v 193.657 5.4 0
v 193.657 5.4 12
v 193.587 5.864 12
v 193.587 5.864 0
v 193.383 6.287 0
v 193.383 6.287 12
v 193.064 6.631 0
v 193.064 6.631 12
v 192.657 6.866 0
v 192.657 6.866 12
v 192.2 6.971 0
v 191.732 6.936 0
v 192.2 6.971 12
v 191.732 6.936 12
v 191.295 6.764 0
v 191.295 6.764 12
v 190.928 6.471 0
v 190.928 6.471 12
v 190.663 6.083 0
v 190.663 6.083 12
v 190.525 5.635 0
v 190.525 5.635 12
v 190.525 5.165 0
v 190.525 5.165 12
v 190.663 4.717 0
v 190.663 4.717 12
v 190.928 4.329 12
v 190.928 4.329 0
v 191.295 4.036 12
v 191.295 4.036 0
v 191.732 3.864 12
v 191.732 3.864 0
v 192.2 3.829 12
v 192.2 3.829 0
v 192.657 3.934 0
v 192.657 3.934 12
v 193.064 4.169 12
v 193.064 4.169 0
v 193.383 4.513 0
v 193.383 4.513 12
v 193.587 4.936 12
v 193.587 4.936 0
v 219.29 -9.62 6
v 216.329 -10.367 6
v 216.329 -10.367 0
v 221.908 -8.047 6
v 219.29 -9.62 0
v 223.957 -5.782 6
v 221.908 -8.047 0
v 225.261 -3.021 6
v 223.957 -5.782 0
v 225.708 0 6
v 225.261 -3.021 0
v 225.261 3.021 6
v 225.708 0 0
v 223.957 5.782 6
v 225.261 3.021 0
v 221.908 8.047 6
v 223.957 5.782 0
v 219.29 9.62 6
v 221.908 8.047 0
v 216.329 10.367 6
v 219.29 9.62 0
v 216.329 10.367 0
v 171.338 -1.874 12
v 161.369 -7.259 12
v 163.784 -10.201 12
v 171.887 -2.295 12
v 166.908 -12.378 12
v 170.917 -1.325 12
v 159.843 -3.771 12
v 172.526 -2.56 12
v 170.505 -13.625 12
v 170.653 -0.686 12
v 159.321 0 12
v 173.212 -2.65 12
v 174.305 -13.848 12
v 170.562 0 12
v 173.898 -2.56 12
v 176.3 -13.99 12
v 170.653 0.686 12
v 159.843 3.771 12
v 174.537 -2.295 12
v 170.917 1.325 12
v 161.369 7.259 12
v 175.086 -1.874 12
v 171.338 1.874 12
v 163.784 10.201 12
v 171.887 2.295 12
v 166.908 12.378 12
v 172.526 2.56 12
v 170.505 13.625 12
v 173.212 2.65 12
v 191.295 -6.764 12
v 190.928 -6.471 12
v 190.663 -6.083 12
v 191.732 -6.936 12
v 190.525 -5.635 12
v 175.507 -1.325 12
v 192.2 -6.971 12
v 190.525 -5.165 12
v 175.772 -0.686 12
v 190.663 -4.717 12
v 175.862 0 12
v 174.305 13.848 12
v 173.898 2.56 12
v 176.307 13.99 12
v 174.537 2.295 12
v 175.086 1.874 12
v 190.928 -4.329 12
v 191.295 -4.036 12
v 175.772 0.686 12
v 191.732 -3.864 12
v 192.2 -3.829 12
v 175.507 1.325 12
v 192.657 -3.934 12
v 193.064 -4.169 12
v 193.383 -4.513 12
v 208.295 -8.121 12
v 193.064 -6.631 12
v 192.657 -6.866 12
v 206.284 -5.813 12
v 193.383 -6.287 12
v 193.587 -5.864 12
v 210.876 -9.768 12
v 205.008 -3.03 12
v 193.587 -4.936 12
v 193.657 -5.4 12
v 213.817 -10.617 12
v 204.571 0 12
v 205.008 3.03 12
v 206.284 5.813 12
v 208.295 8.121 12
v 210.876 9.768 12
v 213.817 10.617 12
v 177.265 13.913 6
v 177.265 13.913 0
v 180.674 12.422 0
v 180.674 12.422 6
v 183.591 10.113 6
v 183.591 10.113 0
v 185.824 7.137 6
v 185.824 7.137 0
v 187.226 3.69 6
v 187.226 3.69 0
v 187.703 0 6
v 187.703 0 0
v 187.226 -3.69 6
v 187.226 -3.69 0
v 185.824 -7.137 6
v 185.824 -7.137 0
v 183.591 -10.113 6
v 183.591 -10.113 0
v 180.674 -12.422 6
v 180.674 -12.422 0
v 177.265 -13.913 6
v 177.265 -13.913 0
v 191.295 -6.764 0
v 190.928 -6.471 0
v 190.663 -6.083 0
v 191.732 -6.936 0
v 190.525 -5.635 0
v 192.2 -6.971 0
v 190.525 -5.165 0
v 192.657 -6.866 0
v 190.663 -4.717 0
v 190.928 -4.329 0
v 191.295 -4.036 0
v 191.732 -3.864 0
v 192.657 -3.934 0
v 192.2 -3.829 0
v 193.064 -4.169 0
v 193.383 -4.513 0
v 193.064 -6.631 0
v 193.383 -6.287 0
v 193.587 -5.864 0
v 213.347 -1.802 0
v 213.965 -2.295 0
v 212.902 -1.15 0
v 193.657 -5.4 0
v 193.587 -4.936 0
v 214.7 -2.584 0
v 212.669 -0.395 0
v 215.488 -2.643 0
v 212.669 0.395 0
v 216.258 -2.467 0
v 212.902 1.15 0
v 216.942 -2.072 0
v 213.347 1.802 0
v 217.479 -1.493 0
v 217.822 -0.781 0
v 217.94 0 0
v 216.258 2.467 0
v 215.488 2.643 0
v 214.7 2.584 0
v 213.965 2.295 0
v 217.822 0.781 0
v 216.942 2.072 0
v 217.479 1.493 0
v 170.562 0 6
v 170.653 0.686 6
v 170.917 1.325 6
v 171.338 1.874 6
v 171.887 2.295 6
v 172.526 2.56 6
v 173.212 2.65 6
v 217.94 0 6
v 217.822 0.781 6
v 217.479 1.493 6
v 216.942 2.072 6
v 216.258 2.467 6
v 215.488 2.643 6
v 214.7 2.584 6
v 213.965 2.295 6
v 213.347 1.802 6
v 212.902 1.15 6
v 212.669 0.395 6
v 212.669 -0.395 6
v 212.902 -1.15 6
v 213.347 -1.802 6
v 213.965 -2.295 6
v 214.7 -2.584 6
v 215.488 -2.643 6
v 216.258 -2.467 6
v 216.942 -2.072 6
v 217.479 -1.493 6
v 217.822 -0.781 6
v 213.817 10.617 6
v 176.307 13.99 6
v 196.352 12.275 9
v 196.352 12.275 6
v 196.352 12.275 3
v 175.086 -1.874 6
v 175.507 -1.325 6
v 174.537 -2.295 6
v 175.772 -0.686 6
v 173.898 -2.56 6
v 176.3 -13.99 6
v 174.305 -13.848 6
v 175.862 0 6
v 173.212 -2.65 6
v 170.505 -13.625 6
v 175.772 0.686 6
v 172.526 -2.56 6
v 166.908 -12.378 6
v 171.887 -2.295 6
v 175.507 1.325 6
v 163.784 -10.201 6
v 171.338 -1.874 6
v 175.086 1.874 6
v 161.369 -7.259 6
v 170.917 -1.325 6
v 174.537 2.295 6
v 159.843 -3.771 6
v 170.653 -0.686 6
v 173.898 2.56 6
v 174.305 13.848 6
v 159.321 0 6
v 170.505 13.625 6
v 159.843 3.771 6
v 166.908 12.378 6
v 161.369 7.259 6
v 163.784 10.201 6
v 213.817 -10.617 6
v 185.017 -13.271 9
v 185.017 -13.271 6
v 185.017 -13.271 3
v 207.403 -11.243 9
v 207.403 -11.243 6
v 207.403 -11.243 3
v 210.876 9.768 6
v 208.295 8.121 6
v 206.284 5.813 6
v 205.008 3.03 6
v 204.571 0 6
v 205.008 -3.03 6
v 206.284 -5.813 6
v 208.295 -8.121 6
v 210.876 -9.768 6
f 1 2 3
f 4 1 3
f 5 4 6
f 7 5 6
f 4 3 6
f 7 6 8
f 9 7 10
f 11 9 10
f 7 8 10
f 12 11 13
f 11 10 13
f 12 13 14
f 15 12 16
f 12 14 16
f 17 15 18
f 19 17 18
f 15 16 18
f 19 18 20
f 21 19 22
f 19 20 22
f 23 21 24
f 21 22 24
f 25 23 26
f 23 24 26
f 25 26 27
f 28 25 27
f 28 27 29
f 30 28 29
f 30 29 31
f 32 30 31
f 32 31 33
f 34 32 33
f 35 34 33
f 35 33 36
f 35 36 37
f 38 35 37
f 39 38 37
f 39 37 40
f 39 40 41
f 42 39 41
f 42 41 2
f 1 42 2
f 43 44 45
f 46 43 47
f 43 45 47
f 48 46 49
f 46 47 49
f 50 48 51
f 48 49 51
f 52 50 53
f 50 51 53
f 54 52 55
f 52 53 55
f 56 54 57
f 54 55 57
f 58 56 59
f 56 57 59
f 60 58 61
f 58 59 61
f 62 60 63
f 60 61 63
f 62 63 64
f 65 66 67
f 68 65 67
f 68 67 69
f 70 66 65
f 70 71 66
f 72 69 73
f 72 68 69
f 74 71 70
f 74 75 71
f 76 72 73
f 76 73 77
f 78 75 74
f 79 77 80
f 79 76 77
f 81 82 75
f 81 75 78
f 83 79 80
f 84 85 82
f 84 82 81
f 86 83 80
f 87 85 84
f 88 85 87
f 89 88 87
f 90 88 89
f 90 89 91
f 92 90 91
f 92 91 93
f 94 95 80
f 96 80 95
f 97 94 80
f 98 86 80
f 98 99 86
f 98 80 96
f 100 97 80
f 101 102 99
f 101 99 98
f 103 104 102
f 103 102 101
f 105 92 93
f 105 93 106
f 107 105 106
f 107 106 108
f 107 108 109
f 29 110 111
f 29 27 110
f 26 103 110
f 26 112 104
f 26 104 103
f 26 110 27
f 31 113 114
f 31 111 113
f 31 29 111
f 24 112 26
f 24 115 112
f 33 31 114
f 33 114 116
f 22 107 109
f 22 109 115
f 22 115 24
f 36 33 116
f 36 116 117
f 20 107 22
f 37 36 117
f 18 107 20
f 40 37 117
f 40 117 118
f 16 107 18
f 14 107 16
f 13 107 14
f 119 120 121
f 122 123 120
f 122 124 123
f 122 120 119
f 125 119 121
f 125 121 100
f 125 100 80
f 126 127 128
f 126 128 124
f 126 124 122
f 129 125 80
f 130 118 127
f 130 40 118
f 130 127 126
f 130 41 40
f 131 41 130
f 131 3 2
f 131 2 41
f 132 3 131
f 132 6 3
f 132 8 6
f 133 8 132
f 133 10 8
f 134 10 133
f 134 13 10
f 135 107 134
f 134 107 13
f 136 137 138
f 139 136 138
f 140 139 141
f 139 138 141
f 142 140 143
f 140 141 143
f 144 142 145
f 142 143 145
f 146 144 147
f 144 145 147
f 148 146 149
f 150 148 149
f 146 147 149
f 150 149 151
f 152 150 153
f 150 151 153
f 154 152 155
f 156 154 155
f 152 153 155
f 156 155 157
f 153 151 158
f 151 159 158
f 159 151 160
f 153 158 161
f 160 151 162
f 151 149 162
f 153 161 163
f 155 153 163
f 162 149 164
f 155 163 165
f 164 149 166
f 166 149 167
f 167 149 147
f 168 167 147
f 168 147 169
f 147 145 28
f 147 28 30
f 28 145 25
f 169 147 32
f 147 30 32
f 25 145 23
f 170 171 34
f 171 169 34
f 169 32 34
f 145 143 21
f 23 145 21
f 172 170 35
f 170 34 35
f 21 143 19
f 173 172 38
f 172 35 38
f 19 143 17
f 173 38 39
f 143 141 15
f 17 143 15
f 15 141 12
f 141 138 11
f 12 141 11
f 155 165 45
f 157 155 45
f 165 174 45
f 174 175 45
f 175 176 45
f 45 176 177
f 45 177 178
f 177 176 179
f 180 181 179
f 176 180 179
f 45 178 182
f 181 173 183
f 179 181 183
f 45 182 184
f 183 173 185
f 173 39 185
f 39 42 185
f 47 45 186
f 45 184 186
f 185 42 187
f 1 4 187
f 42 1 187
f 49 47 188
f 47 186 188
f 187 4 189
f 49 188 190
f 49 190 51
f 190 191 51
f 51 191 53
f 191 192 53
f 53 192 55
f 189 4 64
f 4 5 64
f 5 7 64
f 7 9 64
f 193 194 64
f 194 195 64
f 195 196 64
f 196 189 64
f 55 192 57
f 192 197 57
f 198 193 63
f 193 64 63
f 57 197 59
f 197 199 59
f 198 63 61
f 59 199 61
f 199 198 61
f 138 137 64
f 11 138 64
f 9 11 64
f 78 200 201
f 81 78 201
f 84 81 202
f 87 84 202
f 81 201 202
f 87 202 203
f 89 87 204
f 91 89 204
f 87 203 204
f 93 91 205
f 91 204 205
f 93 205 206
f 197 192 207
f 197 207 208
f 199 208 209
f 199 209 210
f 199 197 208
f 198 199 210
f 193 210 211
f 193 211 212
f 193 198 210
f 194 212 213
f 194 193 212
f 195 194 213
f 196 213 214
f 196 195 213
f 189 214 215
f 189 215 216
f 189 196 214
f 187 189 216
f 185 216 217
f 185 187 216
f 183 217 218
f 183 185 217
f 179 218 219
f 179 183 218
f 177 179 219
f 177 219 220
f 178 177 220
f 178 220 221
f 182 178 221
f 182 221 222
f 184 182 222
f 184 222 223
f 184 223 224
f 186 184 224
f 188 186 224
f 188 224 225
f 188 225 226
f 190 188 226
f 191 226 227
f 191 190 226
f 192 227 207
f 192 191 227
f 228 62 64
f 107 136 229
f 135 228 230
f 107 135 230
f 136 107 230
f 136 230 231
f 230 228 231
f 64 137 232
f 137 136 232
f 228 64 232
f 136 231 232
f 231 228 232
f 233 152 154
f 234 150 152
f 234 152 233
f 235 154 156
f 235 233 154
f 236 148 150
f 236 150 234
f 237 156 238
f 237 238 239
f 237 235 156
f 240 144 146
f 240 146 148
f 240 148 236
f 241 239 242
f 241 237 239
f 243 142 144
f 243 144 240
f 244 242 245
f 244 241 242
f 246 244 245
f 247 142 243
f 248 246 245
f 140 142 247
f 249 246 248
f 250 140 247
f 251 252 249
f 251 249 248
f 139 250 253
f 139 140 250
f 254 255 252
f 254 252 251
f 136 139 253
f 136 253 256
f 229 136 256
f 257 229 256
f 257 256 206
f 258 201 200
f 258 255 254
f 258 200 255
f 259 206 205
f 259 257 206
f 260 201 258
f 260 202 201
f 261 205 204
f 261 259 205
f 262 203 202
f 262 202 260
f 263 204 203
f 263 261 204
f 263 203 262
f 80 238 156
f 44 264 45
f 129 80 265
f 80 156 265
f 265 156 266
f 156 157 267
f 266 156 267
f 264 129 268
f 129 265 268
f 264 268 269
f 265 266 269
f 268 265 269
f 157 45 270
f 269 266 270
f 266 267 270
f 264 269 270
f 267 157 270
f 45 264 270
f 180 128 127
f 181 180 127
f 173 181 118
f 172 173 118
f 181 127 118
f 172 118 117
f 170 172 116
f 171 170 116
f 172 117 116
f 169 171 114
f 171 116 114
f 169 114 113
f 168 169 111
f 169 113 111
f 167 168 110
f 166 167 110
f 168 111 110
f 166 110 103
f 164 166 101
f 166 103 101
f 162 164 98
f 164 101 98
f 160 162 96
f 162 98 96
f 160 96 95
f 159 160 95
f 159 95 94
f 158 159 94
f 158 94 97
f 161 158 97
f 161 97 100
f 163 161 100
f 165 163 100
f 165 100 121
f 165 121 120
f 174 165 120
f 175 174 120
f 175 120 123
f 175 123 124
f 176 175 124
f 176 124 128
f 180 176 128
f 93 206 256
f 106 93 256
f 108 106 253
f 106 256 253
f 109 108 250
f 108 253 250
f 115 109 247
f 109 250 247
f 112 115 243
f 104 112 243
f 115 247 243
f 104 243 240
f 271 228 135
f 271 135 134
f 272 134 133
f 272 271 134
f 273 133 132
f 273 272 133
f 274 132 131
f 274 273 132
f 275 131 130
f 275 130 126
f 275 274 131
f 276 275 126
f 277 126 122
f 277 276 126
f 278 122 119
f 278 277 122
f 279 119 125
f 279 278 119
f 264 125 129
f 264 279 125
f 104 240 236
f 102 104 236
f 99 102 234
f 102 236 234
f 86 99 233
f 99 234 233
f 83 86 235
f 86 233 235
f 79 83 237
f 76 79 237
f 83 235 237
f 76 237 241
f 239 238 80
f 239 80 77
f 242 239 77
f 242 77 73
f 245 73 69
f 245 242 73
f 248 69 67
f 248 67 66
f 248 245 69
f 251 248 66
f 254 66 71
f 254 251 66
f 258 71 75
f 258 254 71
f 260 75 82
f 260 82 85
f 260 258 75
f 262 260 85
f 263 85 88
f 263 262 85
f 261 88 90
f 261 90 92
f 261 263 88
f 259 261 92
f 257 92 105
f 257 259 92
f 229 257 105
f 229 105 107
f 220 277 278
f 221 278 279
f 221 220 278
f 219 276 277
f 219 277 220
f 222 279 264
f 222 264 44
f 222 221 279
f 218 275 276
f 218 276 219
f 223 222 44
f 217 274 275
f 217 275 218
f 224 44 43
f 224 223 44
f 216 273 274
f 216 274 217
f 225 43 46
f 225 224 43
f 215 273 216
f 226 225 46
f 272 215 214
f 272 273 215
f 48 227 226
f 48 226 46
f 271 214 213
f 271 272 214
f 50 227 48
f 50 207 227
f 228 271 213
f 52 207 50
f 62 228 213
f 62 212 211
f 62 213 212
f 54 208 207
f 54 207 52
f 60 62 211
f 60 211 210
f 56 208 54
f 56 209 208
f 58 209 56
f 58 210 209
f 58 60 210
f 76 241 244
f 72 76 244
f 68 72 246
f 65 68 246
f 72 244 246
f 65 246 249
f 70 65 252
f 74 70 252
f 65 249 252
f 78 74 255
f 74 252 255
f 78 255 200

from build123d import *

# Parameters (mm, degrees)
BOSS_EXTRUDE13_START = 6
BOSS_EXTRUDE13_DEPTH = 6
BOSS_EXTRUDE14_DEPTH = 12
SKETCH2_19_R         = 10.418590799
SKETCH2_19_R_2       = 2.65
BOSS_EXTRUDE15_DEPTH = 6
CUT_EXTRUDE1_START   = -6
CUT_EXTRUDE1_DEPTH   = 6
CUT_EXTRUDE2_START   = -12
CUT_EXTRUDE2_DEPTH   = 6
CUT_EXTRUDE4_DEPTH   = 6
SKETCH6_R            = 1.575
CUT_EXTRUDE5_DEPTH   = 227.459741668


# Read off the part's stored shape, not the designer's step: Cut-Extrude2
with BuildPart() as part:
    # Sketch2 → Boss-Extrude13 (new body)
    with BuildSketch(Plane.XY.offset(BOSS_EXTRUDE13_START)):
        with BuildLine():
            ThreePointArc((173.212265813, 14.190949605), (163.177749116, 10.034516697), (159.021316208, 0))
            Line((159.021316208, 0), (170.562265813, 0))
            ThreePointArc((170.562265813, 0), (171.338432843, 1.87383297), (173.212265813, 2.65))
            Line((173.212265813, 2.65), (173.212265813, 14.190949605))
        make_face()
        with BuildLine():
            Line((170.562265813, 0), (159.021316208, 0))
            ThreePointArc((159.021316208, 0), (163.177749116, -10.034516697), (173.212265813, -14.190949605))
            Line((173.212265813, -14.190949605), (173.212265813, -2.65))
            ThreePointArc((173.212265813, -2.65), (171.338432843, -1.87383297), (170.562265813, 0))
        make_face()
        with BuildLine():
            ThreePointArc((187.403215418, 0), (183.634025716, 9.63171694), (174.328689217, 14.146966087))
            ThreePointArc((174.328689217, 14.146966087), (173.77091055, 14.179949462), (173.212265813, 14.190949605))
            Line((173.212265813, 14.190949605), (173.212265813, 2.65))
            ThreePointArc((173.212265813, 2.65), (175.086098783, 1.87383297), (175.862265813, 0))
            Line((175.862265813, 0), (187.403215418, 0))
        make_face()
        with BuildLine():
            ThreePointArc((173.212265813, -14.190949605), (173.77091055, -14.179949462), (174.328689217, -14.146966087))
            ThreePointArc((174.328689217, -14.146966087), (183.634025716, -9.63171694), (187.403215418, 0))
            Line((187.403215418, 0), (175.862265813, 0))
            ThreePointArc((175.862265813, 0), (175.086098783, -1.87383297), (173.212265813, -2.65))
            Line((173.212265813, -2.65), (173.212265813, -14.190949605))
        make_face()
        with BuildLine():
            ThreePointArc((173.212265813, 14.190949605), (163.177749116, 10.034516697), (159.021316208, 0))
            Line((159.021316208, 0), (170.562265813, 0))
            ThreePointArc((170.562265813, 0), (171.338432843, 1.87383297), (173.212265813, 2.65))
            Line((173.212265813, 2.65), (173.212265813, 14.190949605))
        make_face()
        with BuildLine():
            Line((170.562265813, 0), (159.021316208, 0))
            ThreePointArc((159.021316208, 0), (163.177749116, -10.034516697), (173.212265813, -14.190949605))
            Line((173.212265813, -14.190949605), (173.212265813, -2.65))
            ThreePointArc((173.212265813, -2.65), (171.338432843, -1.87383297), (170.562265813, 0))
        make_face()
        with BuildLine():
            ThreePointArc((187.403215418, 0), (183.634025716, 9.63171694), (174.328689217, 14.146966087))
            ThreePointArc((174.328689217, 14.146966087), (173.77091055, 14.179949462), (173.212265813, 14.190949605))
            Line((173.212265813, 14.190949605), (173.212265813, 2.65))
            ThreePointArc((173.212265813, 2.65), (175.086098783, 1.87383297), (175.862265813, 0))
            Line((175.862265813, 0), (187.403215418, 0))
        make_face()
        with BuildLine():
            ThreePointArc((173.212265813, -14.190949605), (173.77091055, -14.179949462), (174.328689217, -14.146966087))
            ThreePointArc((174.328689217, -14.146966087), (183.634025716, -9.63171694), (187.403215418, 0))
            Line((187.403215418, 0), (175.862265813, 0))
            ThreePointArc((175.862265813, 0), (175.086098783, -1.87383297), (173.212265813, -2.65))
            Line((173.212265813, -2.65), (173.212265813, -14.190949605))
        make_face()
    extrude(amount=BOSS_EXTRUDE13_DEPTH)

    # Sketch2<18> → Boss-Extrude14 (add)
    with BuildSketch(Plane.XY):
        with BuildLine():
            add(Edge.make_bspline(
                [(216.328689217, 10.366667201), (213.353925458, 10.66477506), (206.696816501, 11.318389968), (196.26008685, 12.293724806), (185.235415917, 13.263427762), (177.892295007, 13.865740213), (174.328689217, 14.146966087)],
                knots=[0.137765812, 0.137765812, 0.137765812, 0.137765812, 0.152428309, 0.170571841, 0.189174522, 0.206706183, 0.206706183, 0.206706183, 0.206706183], degree=3))
            ThreePointArc((174.328689217, 14.146966087), (183.634025716, 9.63171694), (187.403215418, 0))
            Line((187.403215418, 0), (204.87123106, 0))
            ThreePointArc((204.87123106, 0), (207.922765654, 7.367056204), (215.289821859, 10.418590799))
            ThreePointArc((215.289821859, 10.418590799), (215.809903931, 10.405601803), (216.328689217, 10.366667201))
        make_face()
        with BuildLine():
            ThreePointArc((187.403215418, 0), (183.634025716, -9.63171694), (174.328689217, -14.146966087))
            add(Edge.make_bspline(
                [(174.328689217, -14.146966087), (177.892295007, -13.865740213), (185.235415917, -13.263427762), (196.26008685, -12.293724806), (206.696816501, -11.318389968), (213.353925458, -10.66477506), (216.328689217, -10.366667201)],
                knots=[0.793293817, 0.793293817, 0.793293817, 0.793293817, 0.810825478, 0.829428159, 0.847571691, 0.862234188, 0.862234188, 0.862234188, 0.862234188], degree=3))
            ThreePointArc((216.328689217, -10.366667201), (215.809903931, -10.405601803), (215.289821859, -10.418590799))
            ThreePointArc((215.289821859, -10.418590799), (207.922765654, -7.367056204), (204.87123106, 0))
            Line((204.87123106, 0), (187.403215418, 0))
        make_face()
        with BuildLine():
            add(Edge.make_bspline(
                [(216.328689217, 10.366667201), (213.353925458, 10.66477506), (206.696816501, 11.318389968), (196.26008685, 12.293724806), (185.235415917, 13.263427762), (177.892295007, 13.865740213), (174.328689217, 14.146966087)],
                knots=[0.137765812, 0.137765812, 0.137765812, 0.137765812, 0.152428309, 0.170571841, 0.189174522, 0.206706183, 0.206706183, 0.206706183, 0.206706183], degree=3))
            ThreePointArc((174.328689217, 14.146966087), (183.634025716, 9.63171694), (187.403215418, 0))
            Line((187.403215418, 0), (204.87123106, 0))
            ThreePointArc((204.87123106, 0), (207.922765654, 7.367056204), (215.289821859, 10.418590799))
            ThreePointArc((215.289821859, 10.418590799), (215.809903931, 10.405601803), (216.328689217, 10.366667201))
        make_face()
        with BuildLine():
            ThreePointArc((187.403215418, 0), (183.634025716, -9.63171694), (174.328689217, -14.146966087))
            add(Edge.make_bspline(
                [(174.328689217, -14.146966087), (177.892295007, -13.865740213), (185.235415917, -13.263427762), (196.26008685, -12.293724806), (206.696816501, -11.318389968), (213.353925458, -10.66477506), (216.328689217, -10.366667201)],
                knots=[0.793293817, 0.793293817, 0.793293817, 0.793293817, 0.810825478, 0.829428159, 0.847571691, 0.862234188, 0.862234188, 0.862234188, 0.862234188], degree=3))
            ThreePointArc((216.328689217, -10.366667201), (215.809903931, -10.405601803), (215.289821859, -10.418590799))
            ThreePointArc((215.289821859, -10.418590799), (207.922765654, -7.367056204), (204.87123106, 0))
            Line((204.87123106, 0), (187.403215418, 0))
        make_face()
    extrude(amount=BOSS_EXTRUDE14_DEPTH)

    # Sketch2<19> → Boss-Extrude15 (add)
    with BuildSketch(Plane.XY):
        with Locations((215.289821859, 0)):
            Circle(SKETCH2_19_R)
        with Locations((215.289821859, 0)):
            Circle(SKETCH2_19_R_2, mode=Mode.SUBTRACT)
    extrude(amount=BOSS_EXTRUDE15_DEPTH)

    # Sketch3 → Cut-Extrude1 (cut)
    with BuildSketch(Plane.XY.offset(12).offset(CUT_EXTRUDE1_START)):
        with BuildLine():
            ThreePointArc((174.305087765, -13.847895909), (159.321316208, 0), (174.305087765, 13.847895909))
            Line((174.305087765, 13.847895909), (176.307152097, 13.989700975))
            add(Edge.make_bspline(
                [(176.307152097, 13.989700975), (175.647694257, 14.042496099), (174.988206638, 14.094919544), (174.328689217, 14.146966087)],
                knots=[0.203461594, 0.203461594, 0.203461594, 0.203461594, 0.206706183, 0.206706183, 0.206706183, 0.206706183], degree=3))
            ThreePointArc((174.328689217, 14.146966087), (159.021316208, 0), (174.328689217, -14.146966087))
            add(Edge.make_bspline(
                [(174.328689217, -14.146966087), (174.985934365, -14.095098863), (175.643149915, -14.04285733), (176.300335892, -13.990246656)],
                knots=[0.793293817, 0.793293817, 0.793293817, 0.793293817, 0.796527227, 0.796527227, 0.796527227, 0.796527227], degree=3))
            Line((176.300335892, -13.990246656), (174.305087765, -13.847895909))
        make_face()
        with BuildLine():
            add(Edge.make_bspline(
                [(216.328689217, 10.366667201), (215.491519854, 10.450561851), (214.654303032, 10.533983064), (213.817038746, 10.616925102)],
                knots=[0.137765812, 0.137765812, 0.137765812, 0.137765812, 0.141892188, 0.141892188, 0.141892188, 0.141892188], degree=3))
            ThreePointArc((213.817038746, 10.616925102), (204.57123106, 0), (213.817038746, -10.616925102))
            add(Edge.make_bspline(
                [(213.817038746, -10.616925102), (214.654303032, -10.533983064), (215.491519854, -10.450561851), (216.328689217, -10.366667201)],
                knots=[0.858107812, 0.858107812, 0.858107812, 0.858107812, 0.862234188, 0.862234188, 0.862234188, 0.862234188], degree=3))
            ThreePointArc((216.328689217, -10.366667201), (204.87123106, 0), (216.328689217, 10.366667201))
        make_face()
    extrude(amount=CUT_EXTRUDE1_DEPTH, mode=Mode.SUBTRACT)

    # Cut-Extrude2 outline → Cut-Extrude2 (cut)
    with BuildSketch(Plane.XY.offset(12).offset(CUT_EXTRUDE2_START)):
        with BuildLine():
            ThreePointArc((174.328689217, 14.146966087), (175.06538064, 14.06943553), (175.797022727, 13.953568804))
            Line((175.797022727, 13.953568804), (176.307152091, 13.989700975))
            add(Edge.make_bspline(
                [(176.307152091, 13.989700975), (175.647694253, 14.042496099), (174.988206637, 14.094919544), (174.328689217, 14.146966087)],
                knots=[0.203461594, 0.203461594, 0.203461594, 0.203461594, 0.206706183, 0.206706183, 0.206706183, 0.206706183], degree=3))
        make_face()
        with BuildLine():
            Line((176.300335892, -13.990246656), (175.794024244, -13.95412391))
            ThreePointArc((175.794024244, -13.95412391), (175.063868969, -14.069634552), (174.328689217, -14.146966087))
            add(Edge.make_bspline(
                [(174.328689217, -14.146966087), (174.985934365, -14.095098863), (175.643149916, -14.04285733), (176.300335892, -13.990246656)],
                knots=[0.793293817, 0.793293817, 0.793293817, 0.793293817, 0.796527227, 0.796527227, 0.796527227, 0.796527227], degree=3))
        make_face()
    extrude(amount=CUT_EXTRUDE2_DEPTH, mode=Mode.SUBTRACT)

    # Sketch5 → Cut-Extrude4 (cut)
    with BuildSketch(Plane(origin=(0, 0, 0), x_dir=(-1, 0, 0), z_dir=(0, 0, -1))):
        with BuildLine():
            add(Edge.make_bspline(
                [(-177.264696566, -13.912779214), (-176.943250082, -13.938689614), (-176.621796525, -13.964512296), (-176.300335892, -13.990246656)],
                knots=[0.860652575, 0.860652575, 0.860652575, 0.860652575, 0.862234188, 0.862234188, 0.862234188, 0.862234188], degree=3))
            Line((-176.300335892, -13.990246656), (-175.794024244, -13.95412391))
            ThreePointArc((-175.794024244, -13.95412391), (-187.403215336, -0.001524716), (-175.797022727, 13.953568805))
            Line((-175.797022727, 13.953568805), (-176.307152091, 13.989700975))
            add(Edge.make_bspline(
                [(-176.307152091, 13.989700975), (-176.626340558, 13.964147265), (-176.945522049, 13.93850648), (-177.264696566, 13.912779214)],
                knots=[0.137765812, 0.137765812, 0.137765812, 0.137765812, 0.139336246, 0.139336246, 0.139336246, 0.139336246], degree=3))
            ThreePointArc((-177.264696566, 13.912779214), (-187.703215418, 0), (-177.264696566, -13.912779214))
        make_face()
    extrude(amount=-CUT_EXTRUDE4_DEPTH, mode=Mode.SUBTRACT)

    # Sketch6 → Cut-Extrude5 (cut, through all)
    with BuildSketch(Plane.XY.offset(12)):
        with Locations((192.082086145, 5.4)):
            Circle(SKETCH6_R)
        with Locations((192.082086145, -5.4)):
            Circle(SKETCH6_R)
    extrude(amount=-CUT_EXTRUDE5_DEPTH, mode=Mode.SUBTRACT)


solid = part.part
